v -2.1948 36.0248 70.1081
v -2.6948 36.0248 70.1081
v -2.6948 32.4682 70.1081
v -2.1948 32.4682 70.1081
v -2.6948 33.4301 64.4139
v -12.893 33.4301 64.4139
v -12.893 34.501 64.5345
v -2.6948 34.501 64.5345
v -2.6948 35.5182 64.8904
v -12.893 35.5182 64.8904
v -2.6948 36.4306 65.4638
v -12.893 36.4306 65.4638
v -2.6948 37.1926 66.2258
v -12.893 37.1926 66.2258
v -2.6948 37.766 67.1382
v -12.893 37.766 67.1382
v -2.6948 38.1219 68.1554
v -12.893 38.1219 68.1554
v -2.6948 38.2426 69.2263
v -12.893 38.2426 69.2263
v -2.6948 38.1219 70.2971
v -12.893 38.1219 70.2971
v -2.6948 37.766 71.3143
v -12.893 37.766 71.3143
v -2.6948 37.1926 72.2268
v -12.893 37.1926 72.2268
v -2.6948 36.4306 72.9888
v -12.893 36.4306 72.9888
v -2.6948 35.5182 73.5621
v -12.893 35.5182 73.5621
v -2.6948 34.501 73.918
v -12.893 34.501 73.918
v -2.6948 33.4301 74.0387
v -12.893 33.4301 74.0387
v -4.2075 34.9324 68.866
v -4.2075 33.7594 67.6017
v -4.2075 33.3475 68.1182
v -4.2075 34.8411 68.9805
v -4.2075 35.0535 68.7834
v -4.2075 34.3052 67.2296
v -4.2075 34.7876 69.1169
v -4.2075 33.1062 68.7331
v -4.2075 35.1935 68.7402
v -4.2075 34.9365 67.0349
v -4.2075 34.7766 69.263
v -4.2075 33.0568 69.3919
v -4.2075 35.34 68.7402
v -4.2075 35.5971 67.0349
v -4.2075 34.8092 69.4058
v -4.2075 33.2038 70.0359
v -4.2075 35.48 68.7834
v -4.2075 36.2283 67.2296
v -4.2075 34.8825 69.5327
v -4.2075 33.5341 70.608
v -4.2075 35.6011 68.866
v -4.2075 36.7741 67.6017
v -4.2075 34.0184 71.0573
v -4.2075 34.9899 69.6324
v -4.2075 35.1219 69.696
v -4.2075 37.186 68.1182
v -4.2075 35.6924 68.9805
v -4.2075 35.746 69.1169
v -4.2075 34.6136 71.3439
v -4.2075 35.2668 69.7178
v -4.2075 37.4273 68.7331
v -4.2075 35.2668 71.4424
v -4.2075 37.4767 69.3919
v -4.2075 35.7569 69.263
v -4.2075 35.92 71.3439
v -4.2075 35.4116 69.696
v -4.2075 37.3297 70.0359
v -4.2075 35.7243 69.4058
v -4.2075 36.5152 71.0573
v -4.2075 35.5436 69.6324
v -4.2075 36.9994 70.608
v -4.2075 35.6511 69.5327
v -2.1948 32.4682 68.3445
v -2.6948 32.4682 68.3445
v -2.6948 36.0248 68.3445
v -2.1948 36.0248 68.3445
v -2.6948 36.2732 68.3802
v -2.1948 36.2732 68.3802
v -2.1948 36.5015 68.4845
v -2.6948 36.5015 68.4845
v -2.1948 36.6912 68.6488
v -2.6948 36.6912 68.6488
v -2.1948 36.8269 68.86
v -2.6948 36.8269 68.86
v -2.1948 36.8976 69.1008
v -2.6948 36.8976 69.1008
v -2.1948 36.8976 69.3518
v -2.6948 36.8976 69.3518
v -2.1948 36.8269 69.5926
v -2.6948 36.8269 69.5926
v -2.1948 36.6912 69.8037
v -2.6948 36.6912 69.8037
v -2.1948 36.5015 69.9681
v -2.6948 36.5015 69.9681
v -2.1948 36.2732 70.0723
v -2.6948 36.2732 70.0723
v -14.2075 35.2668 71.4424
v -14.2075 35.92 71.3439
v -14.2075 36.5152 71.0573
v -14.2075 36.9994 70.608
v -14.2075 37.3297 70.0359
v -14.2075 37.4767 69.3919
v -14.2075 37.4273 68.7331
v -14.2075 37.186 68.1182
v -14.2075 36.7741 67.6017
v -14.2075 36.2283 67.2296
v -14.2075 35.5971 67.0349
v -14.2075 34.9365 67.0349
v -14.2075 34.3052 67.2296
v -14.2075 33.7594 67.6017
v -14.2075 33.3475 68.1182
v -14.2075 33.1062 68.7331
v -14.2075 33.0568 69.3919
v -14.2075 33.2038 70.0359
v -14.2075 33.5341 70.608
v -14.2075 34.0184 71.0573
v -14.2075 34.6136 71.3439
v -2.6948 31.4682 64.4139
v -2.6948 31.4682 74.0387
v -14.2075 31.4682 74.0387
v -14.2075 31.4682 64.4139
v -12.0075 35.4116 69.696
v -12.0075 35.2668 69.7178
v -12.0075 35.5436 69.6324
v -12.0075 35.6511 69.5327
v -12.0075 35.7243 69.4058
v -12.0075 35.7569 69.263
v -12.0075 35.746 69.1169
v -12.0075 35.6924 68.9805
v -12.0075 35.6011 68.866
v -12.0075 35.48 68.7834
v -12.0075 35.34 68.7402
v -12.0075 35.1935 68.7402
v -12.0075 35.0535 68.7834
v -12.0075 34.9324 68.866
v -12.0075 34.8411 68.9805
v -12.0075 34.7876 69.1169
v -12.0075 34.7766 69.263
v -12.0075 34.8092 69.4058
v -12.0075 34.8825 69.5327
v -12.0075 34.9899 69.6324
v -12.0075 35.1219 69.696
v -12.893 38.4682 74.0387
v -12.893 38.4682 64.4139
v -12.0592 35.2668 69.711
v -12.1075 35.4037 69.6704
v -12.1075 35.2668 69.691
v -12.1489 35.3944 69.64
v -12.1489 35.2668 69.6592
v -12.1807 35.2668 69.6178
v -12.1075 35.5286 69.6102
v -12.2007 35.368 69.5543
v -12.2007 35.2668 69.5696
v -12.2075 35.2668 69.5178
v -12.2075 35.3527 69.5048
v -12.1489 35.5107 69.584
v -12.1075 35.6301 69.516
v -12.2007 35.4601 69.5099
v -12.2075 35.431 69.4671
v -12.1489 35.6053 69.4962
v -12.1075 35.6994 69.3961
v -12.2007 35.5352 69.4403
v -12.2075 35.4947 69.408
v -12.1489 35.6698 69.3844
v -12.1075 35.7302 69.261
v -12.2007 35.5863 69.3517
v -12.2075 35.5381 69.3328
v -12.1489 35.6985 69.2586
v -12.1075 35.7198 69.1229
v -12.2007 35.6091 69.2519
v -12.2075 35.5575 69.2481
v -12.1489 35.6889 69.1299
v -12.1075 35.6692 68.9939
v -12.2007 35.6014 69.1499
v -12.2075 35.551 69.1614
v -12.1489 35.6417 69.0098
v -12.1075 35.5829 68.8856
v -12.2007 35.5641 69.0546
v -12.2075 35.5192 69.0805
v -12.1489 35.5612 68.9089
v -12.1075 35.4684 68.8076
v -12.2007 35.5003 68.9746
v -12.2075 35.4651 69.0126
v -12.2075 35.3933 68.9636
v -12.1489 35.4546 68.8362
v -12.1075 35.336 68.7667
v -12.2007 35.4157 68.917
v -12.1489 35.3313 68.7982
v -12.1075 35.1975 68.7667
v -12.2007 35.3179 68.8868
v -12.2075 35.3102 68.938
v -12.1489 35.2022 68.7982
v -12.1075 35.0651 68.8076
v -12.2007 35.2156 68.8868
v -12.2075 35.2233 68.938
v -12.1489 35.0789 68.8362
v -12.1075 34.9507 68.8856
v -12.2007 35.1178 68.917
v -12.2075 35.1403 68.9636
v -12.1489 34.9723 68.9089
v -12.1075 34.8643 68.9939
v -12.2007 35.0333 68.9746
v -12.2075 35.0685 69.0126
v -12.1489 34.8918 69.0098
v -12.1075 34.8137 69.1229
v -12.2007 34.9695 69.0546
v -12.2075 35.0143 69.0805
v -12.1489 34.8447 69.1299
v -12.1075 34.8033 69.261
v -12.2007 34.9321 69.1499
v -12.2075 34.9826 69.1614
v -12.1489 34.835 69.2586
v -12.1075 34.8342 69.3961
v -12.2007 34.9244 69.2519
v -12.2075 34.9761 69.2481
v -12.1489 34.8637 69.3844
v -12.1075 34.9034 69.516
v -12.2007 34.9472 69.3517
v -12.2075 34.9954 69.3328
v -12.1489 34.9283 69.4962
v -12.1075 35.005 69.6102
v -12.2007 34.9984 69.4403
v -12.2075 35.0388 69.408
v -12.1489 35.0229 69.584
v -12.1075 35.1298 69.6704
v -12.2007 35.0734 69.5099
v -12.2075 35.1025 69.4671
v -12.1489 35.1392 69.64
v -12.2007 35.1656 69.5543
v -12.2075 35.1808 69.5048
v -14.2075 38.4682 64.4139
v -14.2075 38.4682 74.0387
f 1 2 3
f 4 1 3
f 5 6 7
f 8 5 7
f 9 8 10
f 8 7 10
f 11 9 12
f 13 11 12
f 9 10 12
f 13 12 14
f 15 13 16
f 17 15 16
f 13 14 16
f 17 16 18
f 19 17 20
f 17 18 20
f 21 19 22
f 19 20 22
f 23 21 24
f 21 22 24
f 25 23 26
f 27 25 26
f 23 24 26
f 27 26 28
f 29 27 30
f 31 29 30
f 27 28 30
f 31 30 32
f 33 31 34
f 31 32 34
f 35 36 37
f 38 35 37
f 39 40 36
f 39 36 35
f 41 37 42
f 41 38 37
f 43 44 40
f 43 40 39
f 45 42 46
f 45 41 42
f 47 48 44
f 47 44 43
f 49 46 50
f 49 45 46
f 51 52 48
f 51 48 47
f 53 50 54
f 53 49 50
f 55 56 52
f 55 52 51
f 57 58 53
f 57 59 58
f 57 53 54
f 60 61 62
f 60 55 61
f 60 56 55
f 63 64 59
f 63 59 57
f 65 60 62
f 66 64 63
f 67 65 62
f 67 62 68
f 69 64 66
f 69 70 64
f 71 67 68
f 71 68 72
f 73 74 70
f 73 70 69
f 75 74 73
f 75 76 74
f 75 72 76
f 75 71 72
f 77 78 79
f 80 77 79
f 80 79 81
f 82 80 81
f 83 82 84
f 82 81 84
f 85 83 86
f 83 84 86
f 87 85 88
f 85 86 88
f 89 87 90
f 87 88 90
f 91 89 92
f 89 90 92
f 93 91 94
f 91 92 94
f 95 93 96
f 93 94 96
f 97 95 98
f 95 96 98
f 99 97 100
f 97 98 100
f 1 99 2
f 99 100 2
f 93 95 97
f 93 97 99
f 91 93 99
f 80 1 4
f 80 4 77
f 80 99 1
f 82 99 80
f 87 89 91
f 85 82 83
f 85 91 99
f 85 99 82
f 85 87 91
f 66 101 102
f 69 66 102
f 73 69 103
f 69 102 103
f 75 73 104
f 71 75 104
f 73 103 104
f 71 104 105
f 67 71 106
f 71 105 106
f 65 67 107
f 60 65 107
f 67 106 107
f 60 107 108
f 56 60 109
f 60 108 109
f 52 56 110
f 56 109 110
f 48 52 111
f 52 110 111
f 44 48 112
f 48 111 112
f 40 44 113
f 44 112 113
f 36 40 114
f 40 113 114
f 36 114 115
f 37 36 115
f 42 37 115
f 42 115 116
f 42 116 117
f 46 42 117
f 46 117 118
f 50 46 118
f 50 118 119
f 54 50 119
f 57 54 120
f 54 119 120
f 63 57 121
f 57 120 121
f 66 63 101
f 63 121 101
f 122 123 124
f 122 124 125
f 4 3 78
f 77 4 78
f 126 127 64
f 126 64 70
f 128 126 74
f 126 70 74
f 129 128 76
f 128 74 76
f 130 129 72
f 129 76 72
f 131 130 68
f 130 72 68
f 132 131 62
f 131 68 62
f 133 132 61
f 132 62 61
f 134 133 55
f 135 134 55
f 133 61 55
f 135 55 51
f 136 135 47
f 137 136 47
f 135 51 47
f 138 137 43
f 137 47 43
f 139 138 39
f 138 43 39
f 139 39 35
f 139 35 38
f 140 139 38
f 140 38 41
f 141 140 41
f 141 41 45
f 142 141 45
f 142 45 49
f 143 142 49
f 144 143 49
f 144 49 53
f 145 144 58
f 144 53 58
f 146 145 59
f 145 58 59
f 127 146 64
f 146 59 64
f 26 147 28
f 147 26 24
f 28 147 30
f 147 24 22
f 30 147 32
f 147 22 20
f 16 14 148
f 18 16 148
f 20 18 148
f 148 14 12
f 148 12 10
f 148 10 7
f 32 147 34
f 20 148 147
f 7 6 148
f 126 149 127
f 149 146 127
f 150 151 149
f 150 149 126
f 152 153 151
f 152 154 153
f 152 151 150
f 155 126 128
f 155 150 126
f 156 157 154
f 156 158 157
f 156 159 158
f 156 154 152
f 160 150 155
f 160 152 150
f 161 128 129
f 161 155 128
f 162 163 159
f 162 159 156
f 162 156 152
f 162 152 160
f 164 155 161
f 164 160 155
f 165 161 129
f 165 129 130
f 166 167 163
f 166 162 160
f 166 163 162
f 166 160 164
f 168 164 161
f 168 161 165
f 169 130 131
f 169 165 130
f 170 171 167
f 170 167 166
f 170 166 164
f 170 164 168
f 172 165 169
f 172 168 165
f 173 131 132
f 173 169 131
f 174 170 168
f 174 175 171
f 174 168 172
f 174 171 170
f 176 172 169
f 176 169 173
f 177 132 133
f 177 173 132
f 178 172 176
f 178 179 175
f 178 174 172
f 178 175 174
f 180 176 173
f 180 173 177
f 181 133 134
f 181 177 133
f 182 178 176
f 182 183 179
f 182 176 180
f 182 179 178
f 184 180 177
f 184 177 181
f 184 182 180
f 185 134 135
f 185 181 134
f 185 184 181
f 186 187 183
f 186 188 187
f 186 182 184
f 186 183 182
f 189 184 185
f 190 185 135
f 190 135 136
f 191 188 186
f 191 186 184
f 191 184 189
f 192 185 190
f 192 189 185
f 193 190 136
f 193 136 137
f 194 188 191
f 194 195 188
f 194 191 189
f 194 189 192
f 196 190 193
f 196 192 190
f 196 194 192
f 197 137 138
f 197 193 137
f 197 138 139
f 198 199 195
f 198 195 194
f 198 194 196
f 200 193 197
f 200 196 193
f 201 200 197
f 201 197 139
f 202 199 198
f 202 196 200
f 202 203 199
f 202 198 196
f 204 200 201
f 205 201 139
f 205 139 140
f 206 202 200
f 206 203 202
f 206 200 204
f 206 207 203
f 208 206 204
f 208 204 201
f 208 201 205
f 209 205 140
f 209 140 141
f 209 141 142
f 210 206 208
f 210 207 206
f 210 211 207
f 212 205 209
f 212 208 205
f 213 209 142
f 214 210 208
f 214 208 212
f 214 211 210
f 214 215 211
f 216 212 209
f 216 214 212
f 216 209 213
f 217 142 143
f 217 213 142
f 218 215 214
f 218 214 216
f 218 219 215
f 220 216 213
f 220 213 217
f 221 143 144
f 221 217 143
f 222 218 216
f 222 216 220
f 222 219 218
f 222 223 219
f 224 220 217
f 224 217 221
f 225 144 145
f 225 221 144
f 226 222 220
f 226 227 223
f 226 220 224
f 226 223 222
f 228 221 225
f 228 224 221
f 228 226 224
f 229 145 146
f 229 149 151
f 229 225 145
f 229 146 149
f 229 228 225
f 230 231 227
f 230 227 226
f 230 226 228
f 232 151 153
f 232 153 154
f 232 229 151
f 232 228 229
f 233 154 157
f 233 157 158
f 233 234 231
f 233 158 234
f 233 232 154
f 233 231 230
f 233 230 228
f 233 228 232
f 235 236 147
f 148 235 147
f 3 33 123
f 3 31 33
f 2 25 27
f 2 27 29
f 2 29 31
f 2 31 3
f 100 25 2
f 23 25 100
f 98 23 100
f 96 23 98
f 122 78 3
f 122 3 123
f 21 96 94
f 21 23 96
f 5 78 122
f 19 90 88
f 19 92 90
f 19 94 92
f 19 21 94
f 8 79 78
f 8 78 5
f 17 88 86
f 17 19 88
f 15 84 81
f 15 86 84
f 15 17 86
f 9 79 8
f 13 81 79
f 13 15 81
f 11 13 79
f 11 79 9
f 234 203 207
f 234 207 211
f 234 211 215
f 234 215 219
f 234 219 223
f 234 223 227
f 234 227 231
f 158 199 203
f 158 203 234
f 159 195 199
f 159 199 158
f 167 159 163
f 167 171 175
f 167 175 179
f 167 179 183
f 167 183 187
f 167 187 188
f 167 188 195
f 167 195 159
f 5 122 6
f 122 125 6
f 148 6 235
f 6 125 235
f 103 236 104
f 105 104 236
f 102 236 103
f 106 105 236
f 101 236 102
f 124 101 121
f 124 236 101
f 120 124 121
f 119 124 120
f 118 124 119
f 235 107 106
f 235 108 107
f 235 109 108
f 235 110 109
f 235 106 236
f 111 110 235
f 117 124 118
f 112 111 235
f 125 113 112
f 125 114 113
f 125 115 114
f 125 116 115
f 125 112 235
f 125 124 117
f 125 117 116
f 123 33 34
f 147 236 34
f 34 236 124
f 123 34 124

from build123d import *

# Parameters (mm, degrees)
CROQUIS1_W              = 1.314474999
CROQUIS1_H              = 9.624843278
SALIENTE_EXTRUIR1_DEPTH = 7
SALIENTE_EXTRUIR2_DEPTH = 10.19818
CROQUIS3_R              = 2.216125171
CORTAR_EXTRUIR1_DEPTH   = 10
CROQUIS4_R              = 0.491522535
SALIENTE_EXTRUIR3_DEPTH = 8
REDONDEO1_R             = 0.2
SALIENTE_EXTRUIR4_DEPTH = 0.5


with BuildPart() as part:
    # Croquis1 → Saliente-Extruir1 (new body)
    with BuildSketch(Plane(origin=(0, 31.468175746, 0), x_dir=(1, 0, 0), z_dir=(0, 1, 0))):
        with Locations((-13.550232167, -69.22627342)):
            Rectangle(CROQUIS1_W, CROQUIS1_H)
    extrude(amount=SALIENTE_EXTRUIR1_DEPTH)

    # Croquis2 → Saliente-Extruir2 (add)
    with BuildSketch(Plane(origin=(-12.892994667, 0, 0), x_dir=(0, 0, -1), z_dir=(1, 0, 0))):
        with BuildLine():
            ThreePointArc((-73.620597099, 31.468175746), (-73.933010103, 32.427133129), (-74.038695059, 33.430144513))
            Line((-74.038695059, 33.430144513), (-74.038695059, 31.468175746))
            Line((-74.038695059, 31.468175746), (-73.620597099, 31.468175746))
        make_face()
        with BuildLine():
            Line((-64.413851781, 31.468175746), (-64.413851781, 33.430144513))
            ThreePointArc((-64.413851781, 33.430144513), (-64.519536737, 32.427133129), (-64.831949741, 31.468175746))
            Line((-64.831949741, 31.468175746), (-64.413851781, 31.468175746))
        make_face()
        with BuildLine():
            ThreePointArc((-64.831949741, 31.468175746), (-64.519536737, 32.427133129), (-64.413851781, 33.430144513))
            ThreePointArc((-64.413851781, 33.430144513), (-69.22627342, 38.242566152), (-74.038695059, 33.430144513))
            ThreePointArc((-74.038695059, 33.430144513), (-73.933010103, 32.427133129), (-73.620597099, 31.468175746))
            Line((-73.620597099, 31.468175746), (-64.831949741, 31.468175746))
        make_face()
    extrude(amount=SALIENTE_EXTRUIR2_DEPTH)

    # Croquis3 → Cortar-Extruir1 (cut)
    with BuildSketch(Plane.ZY.offset(14.207469666)):
        with Locations((69.22627342, 35.266765238)):
            Circle(CROQUIS3_R)
    extrude(amount=-CORTAR_EXTRUIR1_DEPTH, mode=Mode.SUBTRACT)

    # Croquis4 → Saliente-Extruir3 (add)
    with BuildSketch(Plane.ZY.offset(4.207469666)):
        with Locations((69.22627342, 35.266765238)):
            Circle(CROQUIS4_R)
    extrude(amount=SALIENTE_EXTRUIR3_DEPTH)

    # Redondeo1
    redondeo1_edges = [part.edges().sort_by_distance(p)[0] for p in [
        (-12.207469666, 35.266765238, 68.734750885),
    ]]
    fillet(redondeo1_edges, radius=REDONDEO1_R)

    # Croquis5 → Saliente-Extruir4 (add)
    with BuildSketch(Plane(origin=(-2.694814404, 0, 0), x_dir=(0, 0, -1), z_dir=(1, 0, 0))):
        with BuildLine():
            Line((-70.108064563, 36.024784092), (-70.108064563, 32.468175746))
            Line((-70.108064563, 32.468175746), (-68.344482277, 32.468175746))
            Line((-68.344482277, 32.468175746), (-68.344482277, 36.024784092))
            ThreePointArc((-68.344482277, 36.024784092), (-69.22627342, 36.906575235), (-70.108064563, 36.024784092))
        make_face()
    extrude(amount=SALIENTE_EXTRUIR4_DEPTH)


solid = part.part
